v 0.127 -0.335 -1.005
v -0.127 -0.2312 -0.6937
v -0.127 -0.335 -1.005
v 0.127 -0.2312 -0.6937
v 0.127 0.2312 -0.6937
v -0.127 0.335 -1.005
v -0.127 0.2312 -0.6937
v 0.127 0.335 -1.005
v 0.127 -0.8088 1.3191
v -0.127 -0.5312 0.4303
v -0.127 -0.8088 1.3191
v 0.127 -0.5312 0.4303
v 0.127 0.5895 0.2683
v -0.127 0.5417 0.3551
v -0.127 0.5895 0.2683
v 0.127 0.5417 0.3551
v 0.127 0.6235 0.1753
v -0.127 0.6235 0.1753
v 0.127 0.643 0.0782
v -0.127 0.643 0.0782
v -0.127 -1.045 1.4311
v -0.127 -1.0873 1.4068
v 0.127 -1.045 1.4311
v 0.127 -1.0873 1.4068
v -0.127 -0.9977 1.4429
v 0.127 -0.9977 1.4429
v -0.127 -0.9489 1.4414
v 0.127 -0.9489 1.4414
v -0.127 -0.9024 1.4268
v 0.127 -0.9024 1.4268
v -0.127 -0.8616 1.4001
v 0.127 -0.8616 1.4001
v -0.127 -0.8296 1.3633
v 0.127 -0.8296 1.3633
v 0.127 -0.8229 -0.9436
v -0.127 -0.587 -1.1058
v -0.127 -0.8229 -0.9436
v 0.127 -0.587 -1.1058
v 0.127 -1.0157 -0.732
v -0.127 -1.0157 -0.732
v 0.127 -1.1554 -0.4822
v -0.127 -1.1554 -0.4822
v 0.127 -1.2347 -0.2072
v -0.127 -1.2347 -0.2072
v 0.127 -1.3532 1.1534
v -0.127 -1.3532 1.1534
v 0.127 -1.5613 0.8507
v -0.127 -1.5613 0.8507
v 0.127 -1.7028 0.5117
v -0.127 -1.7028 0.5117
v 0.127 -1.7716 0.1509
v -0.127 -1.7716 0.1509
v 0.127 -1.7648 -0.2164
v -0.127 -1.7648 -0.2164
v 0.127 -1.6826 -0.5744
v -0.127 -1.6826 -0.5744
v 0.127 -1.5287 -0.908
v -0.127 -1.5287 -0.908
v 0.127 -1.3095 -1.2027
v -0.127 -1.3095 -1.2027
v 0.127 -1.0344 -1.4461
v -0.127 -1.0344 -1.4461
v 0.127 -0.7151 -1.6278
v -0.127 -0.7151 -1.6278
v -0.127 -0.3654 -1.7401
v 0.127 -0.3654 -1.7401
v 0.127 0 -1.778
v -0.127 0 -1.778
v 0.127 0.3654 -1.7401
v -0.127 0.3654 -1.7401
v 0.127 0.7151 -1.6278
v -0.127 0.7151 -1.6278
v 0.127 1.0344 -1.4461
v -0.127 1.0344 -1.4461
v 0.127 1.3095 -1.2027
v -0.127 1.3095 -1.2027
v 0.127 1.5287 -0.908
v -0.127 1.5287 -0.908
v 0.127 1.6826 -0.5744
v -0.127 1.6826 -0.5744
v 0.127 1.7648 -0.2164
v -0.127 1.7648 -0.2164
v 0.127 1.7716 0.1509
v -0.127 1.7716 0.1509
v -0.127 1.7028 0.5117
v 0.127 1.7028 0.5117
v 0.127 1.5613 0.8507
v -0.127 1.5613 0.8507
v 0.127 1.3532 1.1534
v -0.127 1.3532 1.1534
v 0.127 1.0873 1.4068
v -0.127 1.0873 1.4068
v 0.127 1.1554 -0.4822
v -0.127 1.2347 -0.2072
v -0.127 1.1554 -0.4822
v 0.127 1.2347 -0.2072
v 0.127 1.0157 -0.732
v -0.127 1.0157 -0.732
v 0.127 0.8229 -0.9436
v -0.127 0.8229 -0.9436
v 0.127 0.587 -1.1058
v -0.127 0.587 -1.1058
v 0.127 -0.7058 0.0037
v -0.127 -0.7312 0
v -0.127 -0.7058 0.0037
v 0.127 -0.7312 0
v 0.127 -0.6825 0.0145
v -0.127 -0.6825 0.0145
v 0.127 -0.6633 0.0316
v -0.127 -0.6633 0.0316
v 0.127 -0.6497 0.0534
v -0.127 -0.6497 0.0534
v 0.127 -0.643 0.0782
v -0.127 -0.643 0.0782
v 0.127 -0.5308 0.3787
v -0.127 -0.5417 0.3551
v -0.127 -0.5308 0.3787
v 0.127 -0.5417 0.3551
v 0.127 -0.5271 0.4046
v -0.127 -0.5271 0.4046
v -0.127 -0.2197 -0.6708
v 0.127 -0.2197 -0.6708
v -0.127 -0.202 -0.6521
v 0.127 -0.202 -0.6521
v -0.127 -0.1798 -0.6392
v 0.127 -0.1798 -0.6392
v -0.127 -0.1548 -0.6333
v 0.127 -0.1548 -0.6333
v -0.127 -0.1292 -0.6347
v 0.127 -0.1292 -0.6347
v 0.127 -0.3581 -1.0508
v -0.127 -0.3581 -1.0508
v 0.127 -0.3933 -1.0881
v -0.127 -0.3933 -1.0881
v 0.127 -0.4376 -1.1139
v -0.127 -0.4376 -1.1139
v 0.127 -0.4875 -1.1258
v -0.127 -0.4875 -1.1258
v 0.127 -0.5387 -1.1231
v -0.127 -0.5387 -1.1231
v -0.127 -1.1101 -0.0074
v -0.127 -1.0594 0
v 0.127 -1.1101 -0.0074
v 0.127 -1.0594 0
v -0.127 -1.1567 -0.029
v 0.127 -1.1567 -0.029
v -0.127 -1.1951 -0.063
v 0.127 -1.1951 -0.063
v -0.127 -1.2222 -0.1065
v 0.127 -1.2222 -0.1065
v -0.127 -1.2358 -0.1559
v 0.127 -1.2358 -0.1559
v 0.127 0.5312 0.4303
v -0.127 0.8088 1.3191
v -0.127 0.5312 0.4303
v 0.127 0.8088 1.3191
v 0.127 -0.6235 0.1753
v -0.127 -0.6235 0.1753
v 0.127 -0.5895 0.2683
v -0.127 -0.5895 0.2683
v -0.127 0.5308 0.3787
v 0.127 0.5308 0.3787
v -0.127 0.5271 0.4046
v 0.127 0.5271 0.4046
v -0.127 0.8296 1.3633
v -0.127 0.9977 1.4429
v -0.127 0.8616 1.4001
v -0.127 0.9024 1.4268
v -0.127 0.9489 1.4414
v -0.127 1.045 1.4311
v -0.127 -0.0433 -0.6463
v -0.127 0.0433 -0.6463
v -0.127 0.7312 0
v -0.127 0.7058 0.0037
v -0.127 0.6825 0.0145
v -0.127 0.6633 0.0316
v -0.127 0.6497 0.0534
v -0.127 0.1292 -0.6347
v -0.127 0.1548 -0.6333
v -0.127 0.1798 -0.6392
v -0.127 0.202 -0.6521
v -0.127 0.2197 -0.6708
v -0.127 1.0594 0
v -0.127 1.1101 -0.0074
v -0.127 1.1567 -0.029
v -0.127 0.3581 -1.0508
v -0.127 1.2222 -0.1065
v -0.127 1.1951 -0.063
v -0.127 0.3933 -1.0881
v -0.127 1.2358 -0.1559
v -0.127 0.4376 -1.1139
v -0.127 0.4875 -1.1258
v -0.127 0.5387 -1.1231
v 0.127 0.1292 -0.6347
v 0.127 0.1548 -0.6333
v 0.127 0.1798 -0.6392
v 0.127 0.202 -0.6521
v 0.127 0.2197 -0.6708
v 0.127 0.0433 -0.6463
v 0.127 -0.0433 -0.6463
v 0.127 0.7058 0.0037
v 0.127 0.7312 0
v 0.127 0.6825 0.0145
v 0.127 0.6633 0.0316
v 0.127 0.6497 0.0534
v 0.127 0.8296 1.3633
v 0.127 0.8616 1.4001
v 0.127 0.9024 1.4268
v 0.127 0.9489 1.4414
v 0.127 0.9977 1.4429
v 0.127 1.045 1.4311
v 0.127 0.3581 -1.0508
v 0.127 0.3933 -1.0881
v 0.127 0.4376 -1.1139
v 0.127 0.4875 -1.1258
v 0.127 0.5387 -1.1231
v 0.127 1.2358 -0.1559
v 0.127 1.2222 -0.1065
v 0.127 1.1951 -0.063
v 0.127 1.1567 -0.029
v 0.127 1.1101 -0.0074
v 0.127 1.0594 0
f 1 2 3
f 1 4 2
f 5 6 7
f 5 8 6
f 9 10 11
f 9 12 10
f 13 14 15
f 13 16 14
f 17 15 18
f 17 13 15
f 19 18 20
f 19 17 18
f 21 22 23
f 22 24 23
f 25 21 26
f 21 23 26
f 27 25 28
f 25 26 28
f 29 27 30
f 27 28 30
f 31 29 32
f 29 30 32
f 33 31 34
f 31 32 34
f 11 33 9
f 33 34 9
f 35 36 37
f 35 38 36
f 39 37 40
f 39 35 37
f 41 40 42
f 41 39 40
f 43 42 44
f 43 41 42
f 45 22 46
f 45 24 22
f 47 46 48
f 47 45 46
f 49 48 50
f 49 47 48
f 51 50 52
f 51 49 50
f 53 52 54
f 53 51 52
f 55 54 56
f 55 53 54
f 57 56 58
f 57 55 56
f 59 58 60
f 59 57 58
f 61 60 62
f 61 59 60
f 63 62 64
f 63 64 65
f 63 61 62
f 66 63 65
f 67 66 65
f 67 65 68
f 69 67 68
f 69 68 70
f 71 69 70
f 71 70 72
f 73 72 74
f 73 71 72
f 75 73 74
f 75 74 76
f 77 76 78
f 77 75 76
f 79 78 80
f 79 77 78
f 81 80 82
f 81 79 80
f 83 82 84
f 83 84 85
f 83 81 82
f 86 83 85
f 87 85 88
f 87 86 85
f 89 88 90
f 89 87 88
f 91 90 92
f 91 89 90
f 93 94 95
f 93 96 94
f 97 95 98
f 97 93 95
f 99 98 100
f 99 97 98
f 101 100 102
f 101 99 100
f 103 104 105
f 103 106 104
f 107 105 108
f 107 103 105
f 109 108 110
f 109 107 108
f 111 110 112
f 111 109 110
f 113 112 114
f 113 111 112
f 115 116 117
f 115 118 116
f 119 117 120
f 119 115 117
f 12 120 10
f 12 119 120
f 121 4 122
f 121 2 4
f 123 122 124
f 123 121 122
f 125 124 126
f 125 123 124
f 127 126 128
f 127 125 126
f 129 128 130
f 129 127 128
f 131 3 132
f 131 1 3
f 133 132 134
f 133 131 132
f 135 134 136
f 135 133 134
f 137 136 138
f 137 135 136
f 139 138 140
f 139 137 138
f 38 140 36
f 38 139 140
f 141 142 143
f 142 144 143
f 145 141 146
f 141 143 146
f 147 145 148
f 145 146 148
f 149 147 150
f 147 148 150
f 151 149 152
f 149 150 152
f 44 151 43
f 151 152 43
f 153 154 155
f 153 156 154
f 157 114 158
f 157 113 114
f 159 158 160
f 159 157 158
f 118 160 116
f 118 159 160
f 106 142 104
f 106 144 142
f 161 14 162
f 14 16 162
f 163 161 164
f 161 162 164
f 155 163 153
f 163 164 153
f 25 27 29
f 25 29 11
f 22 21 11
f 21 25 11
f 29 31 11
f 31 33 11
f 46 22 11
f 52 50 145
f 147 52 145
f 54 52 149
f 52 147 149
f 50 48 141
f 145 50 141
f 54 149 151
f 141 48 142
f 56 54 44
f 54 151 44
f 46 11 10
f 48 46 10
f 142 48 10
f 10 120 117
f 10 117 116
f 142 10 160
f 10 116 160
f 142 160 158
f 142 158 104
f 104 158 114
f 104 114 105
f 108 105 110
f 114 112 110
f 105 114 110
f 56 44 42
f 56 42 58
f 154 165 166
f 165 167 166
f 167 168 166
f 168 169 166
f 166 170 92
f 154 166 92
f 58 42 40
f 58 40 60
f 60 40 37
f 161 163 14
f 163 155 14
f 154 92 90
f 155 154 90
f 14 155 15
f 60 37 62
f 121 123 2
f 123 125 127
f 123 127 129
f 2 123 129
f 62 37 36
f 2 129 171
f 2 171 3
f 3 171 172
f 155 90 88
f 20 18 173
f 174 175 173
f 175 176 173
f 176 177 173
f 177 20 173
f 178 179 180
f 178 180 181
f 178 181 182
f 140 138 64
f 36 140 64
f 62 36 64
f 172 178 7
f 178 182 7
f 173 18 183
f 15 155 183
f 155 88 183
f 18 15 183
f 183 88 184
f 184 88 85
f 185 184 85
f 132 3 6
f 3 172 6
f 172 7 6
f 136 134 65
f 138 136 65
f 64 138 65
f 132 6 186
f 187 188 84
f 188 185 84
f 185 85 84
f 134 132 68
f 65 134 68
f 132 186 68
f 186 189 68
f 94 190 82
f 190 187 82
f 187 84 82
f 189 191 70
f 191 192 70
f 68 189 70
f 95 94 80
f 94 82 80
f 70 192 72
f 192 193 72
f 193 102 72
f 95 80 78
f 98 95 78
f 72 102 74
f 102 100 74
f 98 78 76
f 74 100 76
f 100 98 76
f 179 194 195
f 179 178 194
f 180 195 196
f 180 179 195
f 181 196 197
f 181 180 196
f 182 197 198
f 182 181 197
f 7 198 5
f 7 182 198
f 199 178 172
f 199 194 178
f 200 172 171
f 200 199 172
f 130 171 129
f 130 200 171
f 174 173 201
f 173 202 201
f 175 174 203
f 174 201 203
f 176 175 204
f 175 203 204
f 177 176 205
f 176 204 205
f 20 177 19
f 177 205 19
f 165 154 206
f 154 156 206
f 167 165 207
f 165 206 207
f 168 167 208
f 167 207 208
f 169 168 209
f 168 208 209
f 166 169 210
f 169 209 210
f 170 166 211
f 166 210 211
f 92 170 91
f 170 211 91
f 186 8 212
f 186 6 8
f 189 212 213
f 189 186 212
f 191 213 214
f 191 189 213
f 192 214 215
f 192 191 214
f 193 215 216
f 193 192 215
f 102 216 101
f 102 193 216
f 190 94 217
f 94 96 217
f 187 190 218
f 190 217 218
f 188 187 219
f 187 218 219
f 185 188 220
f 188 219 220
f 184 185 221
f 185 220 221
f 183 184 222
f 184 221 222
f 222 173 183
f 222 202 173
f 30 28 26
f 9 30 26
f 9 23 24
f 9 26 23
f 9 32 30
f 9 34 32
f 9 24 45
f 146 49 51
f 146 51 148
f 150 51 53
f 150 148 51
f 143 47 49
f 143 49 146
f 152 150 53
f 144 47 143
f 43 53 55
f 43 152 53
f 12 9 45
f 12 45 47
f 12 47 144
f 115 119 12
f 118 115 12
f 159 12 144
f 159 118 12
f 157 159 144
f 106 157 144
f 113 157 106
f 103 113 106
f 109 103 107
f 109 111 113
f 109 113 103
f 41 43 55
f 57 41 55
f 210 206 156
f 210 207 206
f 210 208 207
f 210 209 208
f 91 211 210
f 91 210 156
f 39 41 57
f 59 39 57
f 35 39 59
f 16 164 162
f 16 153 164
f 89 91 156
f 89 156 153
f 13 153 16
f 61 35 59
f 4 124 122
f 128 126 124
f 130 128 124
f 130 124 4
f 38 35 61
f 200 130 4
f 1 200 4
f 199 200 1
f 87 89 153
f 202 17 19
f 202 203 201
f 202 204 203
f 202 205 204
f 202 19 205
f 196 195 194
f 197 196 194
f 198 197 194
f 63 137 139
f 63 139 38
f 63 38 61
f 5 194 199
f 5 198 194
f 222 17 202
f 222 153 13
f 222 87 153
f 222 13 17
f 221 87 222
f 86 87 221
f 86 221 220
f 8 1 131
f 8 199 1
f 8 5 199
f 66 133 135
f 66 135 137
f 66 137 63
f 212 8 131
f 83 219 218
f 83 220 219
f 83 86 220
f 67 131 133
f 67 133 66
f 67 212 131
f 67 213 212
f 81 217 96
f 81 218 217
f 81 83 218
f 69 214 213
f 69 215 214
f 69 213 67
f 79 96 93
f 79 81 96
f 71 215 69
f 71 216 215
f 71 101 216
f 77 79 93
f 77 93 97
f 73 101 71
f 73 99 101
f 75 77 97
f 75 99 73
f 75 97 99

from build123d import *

# Parameters (mm, degrees)
BOSS_EXTRUDE1_DEPTH      = 0.127
BOSS_EXTRUDE1_DEPTH_BACK = 0.127
FILLET1_R                = 0.1778
FILLET2_R                = 0.0889


with BuildPart() as part:
    # Sketch3 → Boss-Extrude1 (new body, two sides)
    with BuildSketch(Plane(origin=(0, 0, 0), x_dir=(0, 0, -1), z_dir=(1, 0, 0))) as boss_extrude1_sk:
        with BuildLine():
            Line((0.614462172, -0.204820724), (1.187727007, -0.395909002))
            ThreePointArc((1.187727007, -0.395909002), (0.732042187, -1.015654281), (0, -1.251974194))
            Line((0, -1.251974194), (0, -0.6477))
            ThreePointArc((0, -0.6477), (-0.204820724, -0.614462172), (-0.38862, -0.51816))
            Line((-0.38862, -0.51816), (-1.545258105, -0.879466537))
            ThreePointArc((-1.545258105, -0.879466537), (1.778, 0), (-1.545258105, 0.879466537))
            Line((-1.545258105, 0.879466537), (-0.38862, 0.51816))
            ThreePointArc((-0.38862, 0.51816), (-0.204820724, 0.614462172), (0, 0.6477))
            Line((0, 0.6477), (0, 1.251974194))
            ThreePointArc((0, 1.251974194), (0.732042187, 1.015654281), (1.187727007, 0.395909002))
            Line((1.187727007, 0.395909002), (0.614462172, 0.204820724))
            ThreePointArc((0.614462172, 0.204820724), (0.6477, 0), (0.614462172, -0.204820724))
        make_face()
    extrude(amount=BOSS_EXTRUDE1_DEPTH)
    extrude(boss_extrude1_sk.sketch, amount=-BOSS_EXTRUDE1_DEPTH_BACK)

    # Fillet1
    fillet1_edges = [part.edges().sort_by_distance(p)[0] for p in [
        (0, 0.395909002, -1.187727007),
        (0, 1.251974194, 0),
        (0, 0.879466537, 1.545258105),
        (0, -0.879466537, 1.545258105),
        (0, -1.251974194, 0),
        (0, -0.395909002, -1.187727007),
    ]]
    fillet(fillet1_edges, radius=FILLET1_R)

    # Fillet2
    fillet2_edges = [part.edges().sort_by_distance(p)[0] for p in [
        (0, 0.204820724, -0.614462172),
        (0, 0.6477, 0),
        (0, 0.51816, 0.38862),
        (0, -0.51816, 0.38862),
        (0, -0.6477, 0),
        (0, -0.204820724, -0.614462172),
    ]]
    fillet(fillet2_edges, radius=FILLET2_R)


solid = part.part
